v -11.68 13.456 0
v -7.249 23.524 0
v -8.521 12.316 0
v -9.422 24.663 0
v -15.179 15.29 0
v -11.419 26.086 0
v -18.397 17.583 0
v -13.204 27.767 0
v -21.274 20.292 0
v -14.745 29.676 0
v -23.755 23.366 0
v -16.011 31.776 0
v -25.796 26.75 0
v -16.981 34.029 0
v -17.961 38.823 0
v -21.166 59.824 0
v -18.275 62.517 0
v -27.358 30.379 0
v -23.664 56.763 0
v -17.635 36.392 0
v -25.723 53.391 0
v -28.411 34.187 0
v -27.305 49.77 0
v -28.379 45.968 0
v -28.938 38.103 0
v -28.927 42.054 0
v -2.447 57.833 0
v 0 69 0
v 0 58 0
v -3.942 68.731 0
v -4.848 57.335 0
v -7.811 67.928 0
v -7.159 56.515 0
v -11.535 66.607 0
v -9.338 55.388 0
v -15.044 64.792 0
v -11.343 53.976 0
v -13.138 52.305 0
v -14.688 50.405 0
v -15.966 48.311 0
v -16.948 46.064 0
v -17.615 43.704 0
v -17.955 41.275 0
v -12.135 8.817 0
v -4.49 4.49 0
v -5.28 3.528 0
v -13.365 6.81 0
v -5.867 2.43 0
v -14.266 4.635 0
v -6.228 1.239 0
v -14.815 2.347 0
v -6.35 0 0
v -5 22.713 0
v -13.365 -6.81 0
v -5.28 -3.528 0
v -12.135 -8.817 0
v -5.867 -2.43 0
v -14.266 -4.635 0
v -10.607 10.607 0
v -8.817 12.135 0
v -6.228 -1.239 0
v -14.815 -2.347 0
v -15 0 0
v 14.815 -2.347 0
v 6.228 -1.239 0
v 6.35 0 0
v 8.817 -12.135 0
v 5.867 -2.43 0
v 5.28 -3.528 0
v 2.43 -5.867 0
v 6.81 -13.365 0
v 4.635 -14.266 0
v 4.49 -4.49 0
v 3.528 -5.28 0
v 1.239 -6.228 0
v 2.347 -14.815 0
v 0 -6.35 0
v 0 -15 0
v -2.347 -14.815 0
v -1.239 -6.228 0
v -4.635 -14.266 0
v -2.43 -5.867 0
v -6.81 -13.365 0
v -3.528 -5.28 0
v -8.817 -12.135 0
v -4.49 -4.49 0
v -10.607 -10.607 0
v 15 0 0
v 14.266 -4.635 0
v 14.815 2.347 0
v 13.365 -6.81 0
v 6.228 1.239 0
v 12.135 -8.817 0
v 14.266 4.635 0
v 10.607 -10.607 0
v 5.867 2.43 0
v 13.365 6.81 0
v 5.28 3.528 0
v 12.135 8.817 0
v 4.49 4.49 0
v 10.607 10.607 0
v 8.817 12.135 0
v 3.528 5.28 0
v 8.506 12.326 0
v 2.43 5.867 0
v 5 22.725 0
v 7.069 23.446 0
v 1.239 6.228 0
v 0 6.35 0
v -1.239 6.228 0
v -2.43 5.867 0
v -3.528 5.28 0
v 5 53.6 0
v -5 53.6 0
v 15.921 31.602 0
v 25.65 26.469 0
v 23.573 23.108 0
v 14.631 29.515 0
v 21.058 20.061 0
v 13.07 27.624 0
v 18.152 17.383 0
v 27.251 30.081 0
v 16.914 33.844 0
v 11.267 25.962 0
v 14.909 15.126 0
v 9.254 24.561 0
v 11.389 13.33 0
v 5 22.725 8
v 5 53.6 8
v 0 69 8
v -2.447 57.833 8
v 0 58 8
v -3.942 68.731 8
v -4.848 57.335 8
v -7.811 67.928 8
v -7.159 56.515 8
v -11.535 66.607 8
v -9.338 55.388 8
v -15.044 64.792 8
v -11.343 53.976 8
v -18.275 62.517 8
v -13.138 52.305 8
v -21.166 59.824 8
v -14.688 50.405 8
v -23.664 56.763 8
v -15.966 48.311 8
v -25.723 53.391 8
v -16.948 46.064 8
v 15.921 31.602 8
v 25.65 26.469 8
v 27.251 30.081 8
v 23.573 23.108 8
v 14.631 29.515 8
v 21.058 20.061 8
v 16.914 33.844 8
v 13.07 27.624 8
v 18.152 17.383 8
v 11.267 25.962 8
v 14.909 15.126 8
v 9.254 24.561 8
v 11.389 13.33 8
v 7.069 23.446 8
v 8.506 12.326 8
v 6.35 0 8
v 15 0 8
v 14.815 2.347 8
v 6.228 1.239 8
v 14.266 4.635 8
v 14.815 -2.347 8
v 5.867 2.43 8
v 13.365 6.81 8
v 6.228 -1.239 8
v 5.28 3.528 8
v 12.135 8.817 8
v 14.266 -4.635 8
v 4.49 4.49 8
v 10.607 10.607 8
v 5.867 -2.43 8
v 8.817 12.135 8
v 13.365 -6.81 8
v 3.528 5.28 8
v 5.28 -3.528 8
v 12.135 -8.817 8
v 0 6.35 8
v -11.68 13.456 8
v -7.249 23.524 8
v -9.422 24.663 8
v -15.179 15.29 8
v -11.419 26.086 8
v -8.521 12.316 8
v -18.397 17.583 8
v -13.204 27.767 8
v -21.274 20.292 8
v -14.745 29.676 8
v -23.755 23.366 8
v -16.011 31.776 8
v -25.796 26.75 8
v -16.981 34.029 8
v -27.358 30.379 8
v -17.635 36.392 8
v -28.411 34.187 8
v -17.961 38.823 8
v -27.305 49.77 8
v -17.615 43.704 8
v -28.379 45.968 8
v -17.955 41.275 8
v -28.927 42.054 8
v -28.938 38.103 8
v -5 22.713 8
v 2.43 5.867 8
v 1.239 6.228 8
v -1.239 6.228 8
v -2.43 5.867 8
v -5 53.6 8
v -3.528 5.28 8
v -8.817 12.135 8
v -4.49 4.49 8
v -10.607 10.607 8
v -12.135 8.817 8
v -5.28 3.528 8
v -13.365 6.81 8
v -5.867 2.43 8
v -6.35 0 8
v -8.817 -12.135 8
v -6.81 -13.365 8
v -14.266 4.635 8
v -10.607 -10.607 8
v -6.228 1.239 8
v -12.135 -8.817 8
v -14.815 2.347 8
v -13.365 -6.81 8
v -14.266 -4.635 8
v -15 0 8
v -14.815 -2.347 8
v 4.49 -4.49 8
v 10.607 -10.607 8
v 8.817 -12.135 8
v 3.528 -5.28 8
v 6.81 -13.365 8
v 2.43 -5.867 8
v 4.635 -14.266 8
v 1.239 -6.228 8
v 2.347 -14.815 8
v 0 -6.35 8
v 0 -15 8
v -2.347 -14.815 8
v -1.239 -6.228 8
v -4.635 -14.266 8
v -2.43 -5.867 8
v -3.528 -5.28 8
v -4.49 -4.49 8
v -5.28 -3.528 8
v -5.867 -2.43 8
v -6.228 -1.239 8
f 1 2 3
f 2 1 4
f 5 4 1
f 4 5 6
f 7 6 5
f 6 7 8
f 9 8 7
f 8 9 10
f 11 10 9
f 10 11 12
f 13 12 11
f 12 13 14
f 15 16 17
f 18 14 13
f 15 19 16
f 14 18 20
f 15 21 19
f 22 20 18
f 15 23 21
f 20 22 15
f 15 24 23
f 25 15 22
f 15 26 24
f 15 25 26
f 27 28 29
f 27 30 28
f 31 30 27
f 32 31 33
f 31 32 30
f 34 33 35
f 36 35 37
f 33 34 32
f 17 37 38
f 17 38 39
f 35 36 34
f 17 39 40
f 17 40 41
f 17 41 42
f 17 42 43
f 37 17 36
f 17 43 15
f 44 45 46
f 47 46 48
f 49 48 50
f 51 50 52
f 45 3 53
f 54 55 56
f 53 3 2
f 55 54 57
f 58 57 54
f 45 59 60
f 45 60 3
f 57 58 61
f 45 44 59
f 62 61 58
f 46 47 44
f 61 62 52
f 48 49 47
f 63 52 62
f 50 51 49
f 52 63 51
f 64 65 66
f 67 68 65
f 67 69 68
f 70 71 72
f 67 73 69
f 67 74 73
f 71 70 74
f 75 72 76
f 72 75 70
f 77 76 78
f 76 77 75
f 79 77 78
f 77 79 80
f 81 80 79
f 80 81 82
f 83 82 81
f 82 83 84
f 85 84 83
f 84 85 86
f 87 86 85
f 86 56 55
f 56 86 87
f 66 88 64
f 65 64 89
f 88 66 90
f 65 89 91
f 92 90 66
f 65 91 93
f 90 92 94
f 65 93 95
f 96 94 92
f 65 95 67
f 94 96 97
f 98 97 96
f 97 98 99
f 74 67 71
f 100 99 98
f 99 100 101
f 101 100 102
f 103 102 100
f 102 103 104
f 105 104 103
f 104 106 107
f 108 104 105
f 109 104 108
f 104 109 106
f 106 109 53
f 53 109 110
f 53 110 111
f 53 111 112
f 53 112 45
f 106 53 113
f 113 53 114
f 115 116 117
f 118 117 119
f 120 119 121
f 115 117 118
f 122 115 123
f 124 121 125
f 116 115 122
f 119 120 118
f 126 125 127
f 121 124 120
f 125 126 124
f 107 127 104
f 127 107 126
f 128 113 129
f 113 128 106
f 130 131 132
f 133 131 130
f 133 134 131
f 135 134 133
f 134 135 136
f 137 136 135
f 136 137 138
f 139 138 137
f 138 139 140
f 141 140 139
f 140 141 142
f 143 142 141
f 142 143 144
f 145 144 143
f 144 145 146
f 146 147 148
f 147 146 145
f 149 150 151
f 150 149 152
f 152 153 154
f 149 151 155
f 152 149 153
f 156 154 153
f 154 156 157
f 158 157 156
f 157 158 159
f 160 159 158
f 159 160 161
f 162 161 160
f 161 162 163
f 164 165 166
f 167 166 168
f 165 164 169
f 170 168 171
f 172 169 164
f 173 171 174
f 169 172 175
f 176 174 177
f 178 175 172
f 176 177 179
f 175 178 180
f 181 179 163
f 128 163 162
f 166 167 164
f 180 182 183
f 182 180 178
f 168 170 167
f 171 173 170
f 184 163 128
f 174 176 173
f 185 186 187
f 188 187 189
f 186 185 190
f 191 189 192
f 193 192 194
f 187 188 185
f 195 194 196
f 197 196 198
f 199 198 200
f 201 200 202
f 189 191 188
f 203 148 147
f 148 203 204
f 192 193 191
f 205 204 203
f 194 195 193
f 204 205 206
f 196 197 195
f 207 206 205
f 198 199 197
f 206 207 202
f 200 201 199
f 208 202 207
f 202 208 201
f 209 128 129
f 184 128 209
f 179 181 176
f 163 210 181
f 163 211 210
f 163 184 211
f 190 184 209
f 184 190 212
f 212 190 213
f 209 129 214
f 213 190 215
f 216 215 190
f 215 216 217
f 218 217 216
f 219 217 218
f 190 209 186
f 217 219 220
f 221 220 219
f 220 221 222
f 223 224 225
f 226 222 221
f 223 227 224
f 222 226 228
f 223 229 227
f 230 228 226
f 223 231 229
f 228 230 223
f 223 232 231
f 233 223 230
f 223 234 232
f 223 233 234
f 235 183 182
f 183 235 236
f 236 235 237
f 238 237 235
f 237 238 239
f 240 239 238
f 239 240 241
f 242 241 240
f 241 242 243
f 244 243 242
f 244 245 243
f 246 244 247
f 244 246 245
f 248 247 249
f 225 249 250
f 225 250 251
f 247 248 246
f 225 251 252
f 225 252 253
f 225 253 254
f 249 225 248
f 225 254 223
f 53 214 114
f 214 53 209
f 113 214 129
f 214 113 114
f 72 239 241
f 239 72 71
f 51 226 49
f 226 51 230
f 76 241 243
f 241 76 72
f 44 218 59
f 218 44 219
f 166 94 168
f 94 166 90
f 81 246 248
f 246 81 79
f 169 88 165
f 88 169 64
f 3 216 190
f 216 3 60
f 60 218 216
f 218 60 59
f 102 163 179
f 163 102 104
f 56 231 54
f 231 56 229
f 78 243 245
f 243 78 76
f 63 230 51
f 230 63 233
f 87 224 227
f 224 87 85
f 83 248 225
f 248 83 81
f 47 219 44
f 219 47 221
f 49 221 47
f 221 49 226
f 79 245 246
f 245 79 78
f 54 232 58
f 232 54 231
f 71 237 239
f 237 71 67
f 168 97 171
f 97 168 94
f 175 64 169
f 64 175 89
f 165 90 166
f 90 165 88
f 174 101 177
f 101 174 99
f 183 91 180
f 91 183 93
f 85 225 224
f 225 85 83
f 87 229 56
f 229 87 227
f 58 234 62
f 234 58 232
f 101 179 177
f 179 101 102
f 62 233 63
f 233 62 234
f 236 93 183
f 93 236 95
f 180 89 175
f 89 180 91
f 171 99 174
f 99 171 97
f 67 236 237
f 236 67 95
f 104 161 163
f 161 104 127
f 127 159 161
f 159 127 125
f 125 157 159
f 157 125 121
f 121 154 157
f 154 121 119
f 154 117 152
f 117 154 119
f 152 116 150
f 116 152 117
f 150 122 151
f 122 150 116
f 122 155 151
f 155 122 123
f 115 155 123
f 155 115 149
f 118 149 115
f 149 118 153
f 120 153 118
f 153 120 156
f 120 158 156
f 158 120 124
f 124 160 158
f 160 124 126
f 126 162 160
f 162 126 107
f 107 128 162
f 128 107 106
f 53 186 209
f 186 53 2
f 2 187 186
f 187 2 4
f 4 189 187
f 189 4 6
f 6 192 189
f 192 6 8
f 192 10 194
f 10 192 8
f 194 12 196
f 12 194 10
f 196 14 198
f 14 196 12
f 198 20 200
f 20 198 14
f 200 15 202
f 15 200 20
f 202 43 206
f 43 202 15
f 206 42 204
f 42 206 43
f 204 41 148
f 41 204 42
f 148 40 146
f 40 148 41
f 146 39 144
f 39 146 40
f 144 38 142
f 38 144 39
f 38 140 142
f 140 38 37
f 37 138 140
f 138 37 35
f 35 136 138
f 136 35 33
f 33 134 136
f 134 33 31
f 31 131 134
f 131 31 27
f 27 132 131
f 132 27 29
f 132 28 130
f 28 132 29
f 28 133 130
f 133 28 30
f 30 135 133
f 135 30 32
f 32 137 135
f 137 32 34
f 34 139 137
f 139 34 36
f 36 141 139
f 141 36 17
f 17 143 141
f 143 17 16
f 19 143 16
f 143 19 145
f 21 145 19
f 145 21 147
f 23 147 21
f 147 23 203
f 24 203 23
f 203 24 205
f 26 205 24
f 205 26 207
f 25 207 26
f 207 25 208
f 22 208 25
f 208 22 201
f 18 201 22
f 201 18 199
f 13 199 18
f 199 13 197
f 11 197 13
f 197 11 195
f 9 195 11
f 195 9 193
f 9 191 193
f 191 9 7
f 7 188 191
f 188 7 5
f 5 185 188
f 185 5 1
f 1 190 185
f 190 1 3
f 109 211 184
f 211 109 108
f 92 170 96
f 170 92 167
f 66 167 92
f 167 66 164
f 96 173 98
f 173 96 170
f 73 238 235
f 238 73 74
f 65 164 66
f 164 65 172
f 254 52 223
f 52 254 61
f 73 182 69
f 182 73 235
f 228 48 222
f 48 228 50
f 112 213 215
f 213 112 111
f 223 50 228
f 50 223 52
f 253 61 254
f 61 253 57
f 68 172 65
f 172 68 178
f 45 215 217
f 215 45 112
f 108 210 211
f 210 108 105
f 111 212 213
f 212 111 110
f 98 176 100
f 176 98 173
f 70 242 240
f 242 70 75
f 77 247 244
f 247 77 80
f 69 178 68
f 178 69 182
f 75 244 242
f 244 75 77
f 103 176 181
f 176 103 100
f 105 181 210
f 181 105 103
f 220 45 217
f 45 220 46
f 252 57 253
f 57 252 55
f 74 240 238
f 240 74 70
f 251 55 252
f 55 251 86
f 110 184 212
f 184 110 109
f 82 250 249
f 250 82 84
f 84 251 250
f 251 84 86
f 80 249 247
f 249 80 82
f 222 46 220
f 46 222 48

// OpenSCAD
$fn = 32;

// ----------------------------------------------------------------------
// Hook: 80 mm shank into a 18 mm curl, 8 mm thick
// ----------------------------------------------------------------------

// --- parameters (mm) ---
shank_len = 80;           // shank length from the boss centre
shank_w = 10;             // shank width
boss_d = 30;              // boss diameter
bore_d = 12.7;            // boss bore
curl_in = 18;             // curl inner radius
curl_out = 29;            // curl outer radius
curl_sweep = 250;         // curl sweep angle
hook_t = 8;               // hook thickness

shank_profile = [[-5, 53.6], [5, 53.6], [5, 13], [-5, 13]];
boss_profile = [[15, 0], [14.815, 2.347], [14.266, 4.635], [13.365, 6.81], [12.135, 8.817], [10.607, 10.607], [8.817, 12.135], [6.81, 13.365], [4.635, 14.266], [2.347, 14.815], [0, 15], [-2.347, 14.815], [-4.635, 14.266], [-6.81, 13.365], [-8.817, 12.135], [-10.607, 10.607], [-12.135, 8.817], [-13.365, 6.81], [-14.266, 4.635], [-14.815, 2.347], [-15, 0], [-14.815, -2.347], [-14.266, -4.635], [-13.365, -6.81], [-12.135, -8.817], [-10.607, -10.607], [-8.817, -12.135], [-6.81, -13.365], [-4.635, -14.266], [-2.347, -14.815], [0, -15], [2.347, -14.815], [4.635, -14.266], [6.81, -13.365], [8.817, -12.135], [10.607, -10.607], [12.135, -8.817], [13.365, -6.81], [14.266, -4.635], [14.815, -2.347]];
curl_profile = [[0, 69], [-3.942, 68.731], [-7.811, 67.928], [-11.535, 66.607], [-15.044, 64.792], [-18.275, 62.517], [-21.166, 59.824], [-23.664, 56.763], [-25.723, 53.391], [-27.305, 49.77], [-28.379, 45.968], [-28.927, 42.054], [-28.938, 38.103], [-28.411, 34.187], [-27.358, 30.379], [-25.796, 26.75], [-23.755, 23.366], [-21.274, 20.292], [-18.397, 17.583], [-15.179, 15.29], [-11.68, 13.456], [-7.963, 12.115], [-4.099, 11.291], [-0.158, 11], [3.785, 11.248], [7.658, 12.03], [11.389, 13.33], [14.909, 15.126], [18.152, 17.383], [21.058, 20.061], [23.573, 23.108], [25.65, 26.469], [27.251, 30.081], [16.914, 33.844], [15.921, 31.602], [14.631, 29.515], [13.07, 27.624], [11.267, 25.962], [9.254, 24.561], [7.069, 23.446], [4.754, 22.639], [2.349, 22.154], [-0.098, 22], [-2.544, 22.181], [-4.943, 22.692], [-7.249, 23.524], [-9.422, 24.663], [-11.419, 26.086], [-13.204, 27.767], [-14.745, 29.676], [-16.011, 31.776], [-16.981, 34.029], [-17.635, 36.392], [-17.961, 38.823], [-17.955, 41.275], [-17.615, 43.704], [-16.948, 46.064], [-15.966, 48.311], [-14.688, 50.405], [-13.138, 52.305], [-11.343, 53.976], [-9.338, 55.388], [-7.159, 56.515], [-4.848, 57.335], [-2.447, 57.833], [0, 58]];

difference() {
  union() {
    /* three overlapping outlines: shank, boss and the smooth curl */
    linear_extrude(height = hook_t) polygon(shank_profile);
    linear_extrude(height = hook_t) polygon(boss_profile);
    linear_extrude(height = hook_t) polygon(curl_profile);
  }
  translate([0, 0, -2.5]) cylinder(h = hook_t + 5, d = bore_d);
}
